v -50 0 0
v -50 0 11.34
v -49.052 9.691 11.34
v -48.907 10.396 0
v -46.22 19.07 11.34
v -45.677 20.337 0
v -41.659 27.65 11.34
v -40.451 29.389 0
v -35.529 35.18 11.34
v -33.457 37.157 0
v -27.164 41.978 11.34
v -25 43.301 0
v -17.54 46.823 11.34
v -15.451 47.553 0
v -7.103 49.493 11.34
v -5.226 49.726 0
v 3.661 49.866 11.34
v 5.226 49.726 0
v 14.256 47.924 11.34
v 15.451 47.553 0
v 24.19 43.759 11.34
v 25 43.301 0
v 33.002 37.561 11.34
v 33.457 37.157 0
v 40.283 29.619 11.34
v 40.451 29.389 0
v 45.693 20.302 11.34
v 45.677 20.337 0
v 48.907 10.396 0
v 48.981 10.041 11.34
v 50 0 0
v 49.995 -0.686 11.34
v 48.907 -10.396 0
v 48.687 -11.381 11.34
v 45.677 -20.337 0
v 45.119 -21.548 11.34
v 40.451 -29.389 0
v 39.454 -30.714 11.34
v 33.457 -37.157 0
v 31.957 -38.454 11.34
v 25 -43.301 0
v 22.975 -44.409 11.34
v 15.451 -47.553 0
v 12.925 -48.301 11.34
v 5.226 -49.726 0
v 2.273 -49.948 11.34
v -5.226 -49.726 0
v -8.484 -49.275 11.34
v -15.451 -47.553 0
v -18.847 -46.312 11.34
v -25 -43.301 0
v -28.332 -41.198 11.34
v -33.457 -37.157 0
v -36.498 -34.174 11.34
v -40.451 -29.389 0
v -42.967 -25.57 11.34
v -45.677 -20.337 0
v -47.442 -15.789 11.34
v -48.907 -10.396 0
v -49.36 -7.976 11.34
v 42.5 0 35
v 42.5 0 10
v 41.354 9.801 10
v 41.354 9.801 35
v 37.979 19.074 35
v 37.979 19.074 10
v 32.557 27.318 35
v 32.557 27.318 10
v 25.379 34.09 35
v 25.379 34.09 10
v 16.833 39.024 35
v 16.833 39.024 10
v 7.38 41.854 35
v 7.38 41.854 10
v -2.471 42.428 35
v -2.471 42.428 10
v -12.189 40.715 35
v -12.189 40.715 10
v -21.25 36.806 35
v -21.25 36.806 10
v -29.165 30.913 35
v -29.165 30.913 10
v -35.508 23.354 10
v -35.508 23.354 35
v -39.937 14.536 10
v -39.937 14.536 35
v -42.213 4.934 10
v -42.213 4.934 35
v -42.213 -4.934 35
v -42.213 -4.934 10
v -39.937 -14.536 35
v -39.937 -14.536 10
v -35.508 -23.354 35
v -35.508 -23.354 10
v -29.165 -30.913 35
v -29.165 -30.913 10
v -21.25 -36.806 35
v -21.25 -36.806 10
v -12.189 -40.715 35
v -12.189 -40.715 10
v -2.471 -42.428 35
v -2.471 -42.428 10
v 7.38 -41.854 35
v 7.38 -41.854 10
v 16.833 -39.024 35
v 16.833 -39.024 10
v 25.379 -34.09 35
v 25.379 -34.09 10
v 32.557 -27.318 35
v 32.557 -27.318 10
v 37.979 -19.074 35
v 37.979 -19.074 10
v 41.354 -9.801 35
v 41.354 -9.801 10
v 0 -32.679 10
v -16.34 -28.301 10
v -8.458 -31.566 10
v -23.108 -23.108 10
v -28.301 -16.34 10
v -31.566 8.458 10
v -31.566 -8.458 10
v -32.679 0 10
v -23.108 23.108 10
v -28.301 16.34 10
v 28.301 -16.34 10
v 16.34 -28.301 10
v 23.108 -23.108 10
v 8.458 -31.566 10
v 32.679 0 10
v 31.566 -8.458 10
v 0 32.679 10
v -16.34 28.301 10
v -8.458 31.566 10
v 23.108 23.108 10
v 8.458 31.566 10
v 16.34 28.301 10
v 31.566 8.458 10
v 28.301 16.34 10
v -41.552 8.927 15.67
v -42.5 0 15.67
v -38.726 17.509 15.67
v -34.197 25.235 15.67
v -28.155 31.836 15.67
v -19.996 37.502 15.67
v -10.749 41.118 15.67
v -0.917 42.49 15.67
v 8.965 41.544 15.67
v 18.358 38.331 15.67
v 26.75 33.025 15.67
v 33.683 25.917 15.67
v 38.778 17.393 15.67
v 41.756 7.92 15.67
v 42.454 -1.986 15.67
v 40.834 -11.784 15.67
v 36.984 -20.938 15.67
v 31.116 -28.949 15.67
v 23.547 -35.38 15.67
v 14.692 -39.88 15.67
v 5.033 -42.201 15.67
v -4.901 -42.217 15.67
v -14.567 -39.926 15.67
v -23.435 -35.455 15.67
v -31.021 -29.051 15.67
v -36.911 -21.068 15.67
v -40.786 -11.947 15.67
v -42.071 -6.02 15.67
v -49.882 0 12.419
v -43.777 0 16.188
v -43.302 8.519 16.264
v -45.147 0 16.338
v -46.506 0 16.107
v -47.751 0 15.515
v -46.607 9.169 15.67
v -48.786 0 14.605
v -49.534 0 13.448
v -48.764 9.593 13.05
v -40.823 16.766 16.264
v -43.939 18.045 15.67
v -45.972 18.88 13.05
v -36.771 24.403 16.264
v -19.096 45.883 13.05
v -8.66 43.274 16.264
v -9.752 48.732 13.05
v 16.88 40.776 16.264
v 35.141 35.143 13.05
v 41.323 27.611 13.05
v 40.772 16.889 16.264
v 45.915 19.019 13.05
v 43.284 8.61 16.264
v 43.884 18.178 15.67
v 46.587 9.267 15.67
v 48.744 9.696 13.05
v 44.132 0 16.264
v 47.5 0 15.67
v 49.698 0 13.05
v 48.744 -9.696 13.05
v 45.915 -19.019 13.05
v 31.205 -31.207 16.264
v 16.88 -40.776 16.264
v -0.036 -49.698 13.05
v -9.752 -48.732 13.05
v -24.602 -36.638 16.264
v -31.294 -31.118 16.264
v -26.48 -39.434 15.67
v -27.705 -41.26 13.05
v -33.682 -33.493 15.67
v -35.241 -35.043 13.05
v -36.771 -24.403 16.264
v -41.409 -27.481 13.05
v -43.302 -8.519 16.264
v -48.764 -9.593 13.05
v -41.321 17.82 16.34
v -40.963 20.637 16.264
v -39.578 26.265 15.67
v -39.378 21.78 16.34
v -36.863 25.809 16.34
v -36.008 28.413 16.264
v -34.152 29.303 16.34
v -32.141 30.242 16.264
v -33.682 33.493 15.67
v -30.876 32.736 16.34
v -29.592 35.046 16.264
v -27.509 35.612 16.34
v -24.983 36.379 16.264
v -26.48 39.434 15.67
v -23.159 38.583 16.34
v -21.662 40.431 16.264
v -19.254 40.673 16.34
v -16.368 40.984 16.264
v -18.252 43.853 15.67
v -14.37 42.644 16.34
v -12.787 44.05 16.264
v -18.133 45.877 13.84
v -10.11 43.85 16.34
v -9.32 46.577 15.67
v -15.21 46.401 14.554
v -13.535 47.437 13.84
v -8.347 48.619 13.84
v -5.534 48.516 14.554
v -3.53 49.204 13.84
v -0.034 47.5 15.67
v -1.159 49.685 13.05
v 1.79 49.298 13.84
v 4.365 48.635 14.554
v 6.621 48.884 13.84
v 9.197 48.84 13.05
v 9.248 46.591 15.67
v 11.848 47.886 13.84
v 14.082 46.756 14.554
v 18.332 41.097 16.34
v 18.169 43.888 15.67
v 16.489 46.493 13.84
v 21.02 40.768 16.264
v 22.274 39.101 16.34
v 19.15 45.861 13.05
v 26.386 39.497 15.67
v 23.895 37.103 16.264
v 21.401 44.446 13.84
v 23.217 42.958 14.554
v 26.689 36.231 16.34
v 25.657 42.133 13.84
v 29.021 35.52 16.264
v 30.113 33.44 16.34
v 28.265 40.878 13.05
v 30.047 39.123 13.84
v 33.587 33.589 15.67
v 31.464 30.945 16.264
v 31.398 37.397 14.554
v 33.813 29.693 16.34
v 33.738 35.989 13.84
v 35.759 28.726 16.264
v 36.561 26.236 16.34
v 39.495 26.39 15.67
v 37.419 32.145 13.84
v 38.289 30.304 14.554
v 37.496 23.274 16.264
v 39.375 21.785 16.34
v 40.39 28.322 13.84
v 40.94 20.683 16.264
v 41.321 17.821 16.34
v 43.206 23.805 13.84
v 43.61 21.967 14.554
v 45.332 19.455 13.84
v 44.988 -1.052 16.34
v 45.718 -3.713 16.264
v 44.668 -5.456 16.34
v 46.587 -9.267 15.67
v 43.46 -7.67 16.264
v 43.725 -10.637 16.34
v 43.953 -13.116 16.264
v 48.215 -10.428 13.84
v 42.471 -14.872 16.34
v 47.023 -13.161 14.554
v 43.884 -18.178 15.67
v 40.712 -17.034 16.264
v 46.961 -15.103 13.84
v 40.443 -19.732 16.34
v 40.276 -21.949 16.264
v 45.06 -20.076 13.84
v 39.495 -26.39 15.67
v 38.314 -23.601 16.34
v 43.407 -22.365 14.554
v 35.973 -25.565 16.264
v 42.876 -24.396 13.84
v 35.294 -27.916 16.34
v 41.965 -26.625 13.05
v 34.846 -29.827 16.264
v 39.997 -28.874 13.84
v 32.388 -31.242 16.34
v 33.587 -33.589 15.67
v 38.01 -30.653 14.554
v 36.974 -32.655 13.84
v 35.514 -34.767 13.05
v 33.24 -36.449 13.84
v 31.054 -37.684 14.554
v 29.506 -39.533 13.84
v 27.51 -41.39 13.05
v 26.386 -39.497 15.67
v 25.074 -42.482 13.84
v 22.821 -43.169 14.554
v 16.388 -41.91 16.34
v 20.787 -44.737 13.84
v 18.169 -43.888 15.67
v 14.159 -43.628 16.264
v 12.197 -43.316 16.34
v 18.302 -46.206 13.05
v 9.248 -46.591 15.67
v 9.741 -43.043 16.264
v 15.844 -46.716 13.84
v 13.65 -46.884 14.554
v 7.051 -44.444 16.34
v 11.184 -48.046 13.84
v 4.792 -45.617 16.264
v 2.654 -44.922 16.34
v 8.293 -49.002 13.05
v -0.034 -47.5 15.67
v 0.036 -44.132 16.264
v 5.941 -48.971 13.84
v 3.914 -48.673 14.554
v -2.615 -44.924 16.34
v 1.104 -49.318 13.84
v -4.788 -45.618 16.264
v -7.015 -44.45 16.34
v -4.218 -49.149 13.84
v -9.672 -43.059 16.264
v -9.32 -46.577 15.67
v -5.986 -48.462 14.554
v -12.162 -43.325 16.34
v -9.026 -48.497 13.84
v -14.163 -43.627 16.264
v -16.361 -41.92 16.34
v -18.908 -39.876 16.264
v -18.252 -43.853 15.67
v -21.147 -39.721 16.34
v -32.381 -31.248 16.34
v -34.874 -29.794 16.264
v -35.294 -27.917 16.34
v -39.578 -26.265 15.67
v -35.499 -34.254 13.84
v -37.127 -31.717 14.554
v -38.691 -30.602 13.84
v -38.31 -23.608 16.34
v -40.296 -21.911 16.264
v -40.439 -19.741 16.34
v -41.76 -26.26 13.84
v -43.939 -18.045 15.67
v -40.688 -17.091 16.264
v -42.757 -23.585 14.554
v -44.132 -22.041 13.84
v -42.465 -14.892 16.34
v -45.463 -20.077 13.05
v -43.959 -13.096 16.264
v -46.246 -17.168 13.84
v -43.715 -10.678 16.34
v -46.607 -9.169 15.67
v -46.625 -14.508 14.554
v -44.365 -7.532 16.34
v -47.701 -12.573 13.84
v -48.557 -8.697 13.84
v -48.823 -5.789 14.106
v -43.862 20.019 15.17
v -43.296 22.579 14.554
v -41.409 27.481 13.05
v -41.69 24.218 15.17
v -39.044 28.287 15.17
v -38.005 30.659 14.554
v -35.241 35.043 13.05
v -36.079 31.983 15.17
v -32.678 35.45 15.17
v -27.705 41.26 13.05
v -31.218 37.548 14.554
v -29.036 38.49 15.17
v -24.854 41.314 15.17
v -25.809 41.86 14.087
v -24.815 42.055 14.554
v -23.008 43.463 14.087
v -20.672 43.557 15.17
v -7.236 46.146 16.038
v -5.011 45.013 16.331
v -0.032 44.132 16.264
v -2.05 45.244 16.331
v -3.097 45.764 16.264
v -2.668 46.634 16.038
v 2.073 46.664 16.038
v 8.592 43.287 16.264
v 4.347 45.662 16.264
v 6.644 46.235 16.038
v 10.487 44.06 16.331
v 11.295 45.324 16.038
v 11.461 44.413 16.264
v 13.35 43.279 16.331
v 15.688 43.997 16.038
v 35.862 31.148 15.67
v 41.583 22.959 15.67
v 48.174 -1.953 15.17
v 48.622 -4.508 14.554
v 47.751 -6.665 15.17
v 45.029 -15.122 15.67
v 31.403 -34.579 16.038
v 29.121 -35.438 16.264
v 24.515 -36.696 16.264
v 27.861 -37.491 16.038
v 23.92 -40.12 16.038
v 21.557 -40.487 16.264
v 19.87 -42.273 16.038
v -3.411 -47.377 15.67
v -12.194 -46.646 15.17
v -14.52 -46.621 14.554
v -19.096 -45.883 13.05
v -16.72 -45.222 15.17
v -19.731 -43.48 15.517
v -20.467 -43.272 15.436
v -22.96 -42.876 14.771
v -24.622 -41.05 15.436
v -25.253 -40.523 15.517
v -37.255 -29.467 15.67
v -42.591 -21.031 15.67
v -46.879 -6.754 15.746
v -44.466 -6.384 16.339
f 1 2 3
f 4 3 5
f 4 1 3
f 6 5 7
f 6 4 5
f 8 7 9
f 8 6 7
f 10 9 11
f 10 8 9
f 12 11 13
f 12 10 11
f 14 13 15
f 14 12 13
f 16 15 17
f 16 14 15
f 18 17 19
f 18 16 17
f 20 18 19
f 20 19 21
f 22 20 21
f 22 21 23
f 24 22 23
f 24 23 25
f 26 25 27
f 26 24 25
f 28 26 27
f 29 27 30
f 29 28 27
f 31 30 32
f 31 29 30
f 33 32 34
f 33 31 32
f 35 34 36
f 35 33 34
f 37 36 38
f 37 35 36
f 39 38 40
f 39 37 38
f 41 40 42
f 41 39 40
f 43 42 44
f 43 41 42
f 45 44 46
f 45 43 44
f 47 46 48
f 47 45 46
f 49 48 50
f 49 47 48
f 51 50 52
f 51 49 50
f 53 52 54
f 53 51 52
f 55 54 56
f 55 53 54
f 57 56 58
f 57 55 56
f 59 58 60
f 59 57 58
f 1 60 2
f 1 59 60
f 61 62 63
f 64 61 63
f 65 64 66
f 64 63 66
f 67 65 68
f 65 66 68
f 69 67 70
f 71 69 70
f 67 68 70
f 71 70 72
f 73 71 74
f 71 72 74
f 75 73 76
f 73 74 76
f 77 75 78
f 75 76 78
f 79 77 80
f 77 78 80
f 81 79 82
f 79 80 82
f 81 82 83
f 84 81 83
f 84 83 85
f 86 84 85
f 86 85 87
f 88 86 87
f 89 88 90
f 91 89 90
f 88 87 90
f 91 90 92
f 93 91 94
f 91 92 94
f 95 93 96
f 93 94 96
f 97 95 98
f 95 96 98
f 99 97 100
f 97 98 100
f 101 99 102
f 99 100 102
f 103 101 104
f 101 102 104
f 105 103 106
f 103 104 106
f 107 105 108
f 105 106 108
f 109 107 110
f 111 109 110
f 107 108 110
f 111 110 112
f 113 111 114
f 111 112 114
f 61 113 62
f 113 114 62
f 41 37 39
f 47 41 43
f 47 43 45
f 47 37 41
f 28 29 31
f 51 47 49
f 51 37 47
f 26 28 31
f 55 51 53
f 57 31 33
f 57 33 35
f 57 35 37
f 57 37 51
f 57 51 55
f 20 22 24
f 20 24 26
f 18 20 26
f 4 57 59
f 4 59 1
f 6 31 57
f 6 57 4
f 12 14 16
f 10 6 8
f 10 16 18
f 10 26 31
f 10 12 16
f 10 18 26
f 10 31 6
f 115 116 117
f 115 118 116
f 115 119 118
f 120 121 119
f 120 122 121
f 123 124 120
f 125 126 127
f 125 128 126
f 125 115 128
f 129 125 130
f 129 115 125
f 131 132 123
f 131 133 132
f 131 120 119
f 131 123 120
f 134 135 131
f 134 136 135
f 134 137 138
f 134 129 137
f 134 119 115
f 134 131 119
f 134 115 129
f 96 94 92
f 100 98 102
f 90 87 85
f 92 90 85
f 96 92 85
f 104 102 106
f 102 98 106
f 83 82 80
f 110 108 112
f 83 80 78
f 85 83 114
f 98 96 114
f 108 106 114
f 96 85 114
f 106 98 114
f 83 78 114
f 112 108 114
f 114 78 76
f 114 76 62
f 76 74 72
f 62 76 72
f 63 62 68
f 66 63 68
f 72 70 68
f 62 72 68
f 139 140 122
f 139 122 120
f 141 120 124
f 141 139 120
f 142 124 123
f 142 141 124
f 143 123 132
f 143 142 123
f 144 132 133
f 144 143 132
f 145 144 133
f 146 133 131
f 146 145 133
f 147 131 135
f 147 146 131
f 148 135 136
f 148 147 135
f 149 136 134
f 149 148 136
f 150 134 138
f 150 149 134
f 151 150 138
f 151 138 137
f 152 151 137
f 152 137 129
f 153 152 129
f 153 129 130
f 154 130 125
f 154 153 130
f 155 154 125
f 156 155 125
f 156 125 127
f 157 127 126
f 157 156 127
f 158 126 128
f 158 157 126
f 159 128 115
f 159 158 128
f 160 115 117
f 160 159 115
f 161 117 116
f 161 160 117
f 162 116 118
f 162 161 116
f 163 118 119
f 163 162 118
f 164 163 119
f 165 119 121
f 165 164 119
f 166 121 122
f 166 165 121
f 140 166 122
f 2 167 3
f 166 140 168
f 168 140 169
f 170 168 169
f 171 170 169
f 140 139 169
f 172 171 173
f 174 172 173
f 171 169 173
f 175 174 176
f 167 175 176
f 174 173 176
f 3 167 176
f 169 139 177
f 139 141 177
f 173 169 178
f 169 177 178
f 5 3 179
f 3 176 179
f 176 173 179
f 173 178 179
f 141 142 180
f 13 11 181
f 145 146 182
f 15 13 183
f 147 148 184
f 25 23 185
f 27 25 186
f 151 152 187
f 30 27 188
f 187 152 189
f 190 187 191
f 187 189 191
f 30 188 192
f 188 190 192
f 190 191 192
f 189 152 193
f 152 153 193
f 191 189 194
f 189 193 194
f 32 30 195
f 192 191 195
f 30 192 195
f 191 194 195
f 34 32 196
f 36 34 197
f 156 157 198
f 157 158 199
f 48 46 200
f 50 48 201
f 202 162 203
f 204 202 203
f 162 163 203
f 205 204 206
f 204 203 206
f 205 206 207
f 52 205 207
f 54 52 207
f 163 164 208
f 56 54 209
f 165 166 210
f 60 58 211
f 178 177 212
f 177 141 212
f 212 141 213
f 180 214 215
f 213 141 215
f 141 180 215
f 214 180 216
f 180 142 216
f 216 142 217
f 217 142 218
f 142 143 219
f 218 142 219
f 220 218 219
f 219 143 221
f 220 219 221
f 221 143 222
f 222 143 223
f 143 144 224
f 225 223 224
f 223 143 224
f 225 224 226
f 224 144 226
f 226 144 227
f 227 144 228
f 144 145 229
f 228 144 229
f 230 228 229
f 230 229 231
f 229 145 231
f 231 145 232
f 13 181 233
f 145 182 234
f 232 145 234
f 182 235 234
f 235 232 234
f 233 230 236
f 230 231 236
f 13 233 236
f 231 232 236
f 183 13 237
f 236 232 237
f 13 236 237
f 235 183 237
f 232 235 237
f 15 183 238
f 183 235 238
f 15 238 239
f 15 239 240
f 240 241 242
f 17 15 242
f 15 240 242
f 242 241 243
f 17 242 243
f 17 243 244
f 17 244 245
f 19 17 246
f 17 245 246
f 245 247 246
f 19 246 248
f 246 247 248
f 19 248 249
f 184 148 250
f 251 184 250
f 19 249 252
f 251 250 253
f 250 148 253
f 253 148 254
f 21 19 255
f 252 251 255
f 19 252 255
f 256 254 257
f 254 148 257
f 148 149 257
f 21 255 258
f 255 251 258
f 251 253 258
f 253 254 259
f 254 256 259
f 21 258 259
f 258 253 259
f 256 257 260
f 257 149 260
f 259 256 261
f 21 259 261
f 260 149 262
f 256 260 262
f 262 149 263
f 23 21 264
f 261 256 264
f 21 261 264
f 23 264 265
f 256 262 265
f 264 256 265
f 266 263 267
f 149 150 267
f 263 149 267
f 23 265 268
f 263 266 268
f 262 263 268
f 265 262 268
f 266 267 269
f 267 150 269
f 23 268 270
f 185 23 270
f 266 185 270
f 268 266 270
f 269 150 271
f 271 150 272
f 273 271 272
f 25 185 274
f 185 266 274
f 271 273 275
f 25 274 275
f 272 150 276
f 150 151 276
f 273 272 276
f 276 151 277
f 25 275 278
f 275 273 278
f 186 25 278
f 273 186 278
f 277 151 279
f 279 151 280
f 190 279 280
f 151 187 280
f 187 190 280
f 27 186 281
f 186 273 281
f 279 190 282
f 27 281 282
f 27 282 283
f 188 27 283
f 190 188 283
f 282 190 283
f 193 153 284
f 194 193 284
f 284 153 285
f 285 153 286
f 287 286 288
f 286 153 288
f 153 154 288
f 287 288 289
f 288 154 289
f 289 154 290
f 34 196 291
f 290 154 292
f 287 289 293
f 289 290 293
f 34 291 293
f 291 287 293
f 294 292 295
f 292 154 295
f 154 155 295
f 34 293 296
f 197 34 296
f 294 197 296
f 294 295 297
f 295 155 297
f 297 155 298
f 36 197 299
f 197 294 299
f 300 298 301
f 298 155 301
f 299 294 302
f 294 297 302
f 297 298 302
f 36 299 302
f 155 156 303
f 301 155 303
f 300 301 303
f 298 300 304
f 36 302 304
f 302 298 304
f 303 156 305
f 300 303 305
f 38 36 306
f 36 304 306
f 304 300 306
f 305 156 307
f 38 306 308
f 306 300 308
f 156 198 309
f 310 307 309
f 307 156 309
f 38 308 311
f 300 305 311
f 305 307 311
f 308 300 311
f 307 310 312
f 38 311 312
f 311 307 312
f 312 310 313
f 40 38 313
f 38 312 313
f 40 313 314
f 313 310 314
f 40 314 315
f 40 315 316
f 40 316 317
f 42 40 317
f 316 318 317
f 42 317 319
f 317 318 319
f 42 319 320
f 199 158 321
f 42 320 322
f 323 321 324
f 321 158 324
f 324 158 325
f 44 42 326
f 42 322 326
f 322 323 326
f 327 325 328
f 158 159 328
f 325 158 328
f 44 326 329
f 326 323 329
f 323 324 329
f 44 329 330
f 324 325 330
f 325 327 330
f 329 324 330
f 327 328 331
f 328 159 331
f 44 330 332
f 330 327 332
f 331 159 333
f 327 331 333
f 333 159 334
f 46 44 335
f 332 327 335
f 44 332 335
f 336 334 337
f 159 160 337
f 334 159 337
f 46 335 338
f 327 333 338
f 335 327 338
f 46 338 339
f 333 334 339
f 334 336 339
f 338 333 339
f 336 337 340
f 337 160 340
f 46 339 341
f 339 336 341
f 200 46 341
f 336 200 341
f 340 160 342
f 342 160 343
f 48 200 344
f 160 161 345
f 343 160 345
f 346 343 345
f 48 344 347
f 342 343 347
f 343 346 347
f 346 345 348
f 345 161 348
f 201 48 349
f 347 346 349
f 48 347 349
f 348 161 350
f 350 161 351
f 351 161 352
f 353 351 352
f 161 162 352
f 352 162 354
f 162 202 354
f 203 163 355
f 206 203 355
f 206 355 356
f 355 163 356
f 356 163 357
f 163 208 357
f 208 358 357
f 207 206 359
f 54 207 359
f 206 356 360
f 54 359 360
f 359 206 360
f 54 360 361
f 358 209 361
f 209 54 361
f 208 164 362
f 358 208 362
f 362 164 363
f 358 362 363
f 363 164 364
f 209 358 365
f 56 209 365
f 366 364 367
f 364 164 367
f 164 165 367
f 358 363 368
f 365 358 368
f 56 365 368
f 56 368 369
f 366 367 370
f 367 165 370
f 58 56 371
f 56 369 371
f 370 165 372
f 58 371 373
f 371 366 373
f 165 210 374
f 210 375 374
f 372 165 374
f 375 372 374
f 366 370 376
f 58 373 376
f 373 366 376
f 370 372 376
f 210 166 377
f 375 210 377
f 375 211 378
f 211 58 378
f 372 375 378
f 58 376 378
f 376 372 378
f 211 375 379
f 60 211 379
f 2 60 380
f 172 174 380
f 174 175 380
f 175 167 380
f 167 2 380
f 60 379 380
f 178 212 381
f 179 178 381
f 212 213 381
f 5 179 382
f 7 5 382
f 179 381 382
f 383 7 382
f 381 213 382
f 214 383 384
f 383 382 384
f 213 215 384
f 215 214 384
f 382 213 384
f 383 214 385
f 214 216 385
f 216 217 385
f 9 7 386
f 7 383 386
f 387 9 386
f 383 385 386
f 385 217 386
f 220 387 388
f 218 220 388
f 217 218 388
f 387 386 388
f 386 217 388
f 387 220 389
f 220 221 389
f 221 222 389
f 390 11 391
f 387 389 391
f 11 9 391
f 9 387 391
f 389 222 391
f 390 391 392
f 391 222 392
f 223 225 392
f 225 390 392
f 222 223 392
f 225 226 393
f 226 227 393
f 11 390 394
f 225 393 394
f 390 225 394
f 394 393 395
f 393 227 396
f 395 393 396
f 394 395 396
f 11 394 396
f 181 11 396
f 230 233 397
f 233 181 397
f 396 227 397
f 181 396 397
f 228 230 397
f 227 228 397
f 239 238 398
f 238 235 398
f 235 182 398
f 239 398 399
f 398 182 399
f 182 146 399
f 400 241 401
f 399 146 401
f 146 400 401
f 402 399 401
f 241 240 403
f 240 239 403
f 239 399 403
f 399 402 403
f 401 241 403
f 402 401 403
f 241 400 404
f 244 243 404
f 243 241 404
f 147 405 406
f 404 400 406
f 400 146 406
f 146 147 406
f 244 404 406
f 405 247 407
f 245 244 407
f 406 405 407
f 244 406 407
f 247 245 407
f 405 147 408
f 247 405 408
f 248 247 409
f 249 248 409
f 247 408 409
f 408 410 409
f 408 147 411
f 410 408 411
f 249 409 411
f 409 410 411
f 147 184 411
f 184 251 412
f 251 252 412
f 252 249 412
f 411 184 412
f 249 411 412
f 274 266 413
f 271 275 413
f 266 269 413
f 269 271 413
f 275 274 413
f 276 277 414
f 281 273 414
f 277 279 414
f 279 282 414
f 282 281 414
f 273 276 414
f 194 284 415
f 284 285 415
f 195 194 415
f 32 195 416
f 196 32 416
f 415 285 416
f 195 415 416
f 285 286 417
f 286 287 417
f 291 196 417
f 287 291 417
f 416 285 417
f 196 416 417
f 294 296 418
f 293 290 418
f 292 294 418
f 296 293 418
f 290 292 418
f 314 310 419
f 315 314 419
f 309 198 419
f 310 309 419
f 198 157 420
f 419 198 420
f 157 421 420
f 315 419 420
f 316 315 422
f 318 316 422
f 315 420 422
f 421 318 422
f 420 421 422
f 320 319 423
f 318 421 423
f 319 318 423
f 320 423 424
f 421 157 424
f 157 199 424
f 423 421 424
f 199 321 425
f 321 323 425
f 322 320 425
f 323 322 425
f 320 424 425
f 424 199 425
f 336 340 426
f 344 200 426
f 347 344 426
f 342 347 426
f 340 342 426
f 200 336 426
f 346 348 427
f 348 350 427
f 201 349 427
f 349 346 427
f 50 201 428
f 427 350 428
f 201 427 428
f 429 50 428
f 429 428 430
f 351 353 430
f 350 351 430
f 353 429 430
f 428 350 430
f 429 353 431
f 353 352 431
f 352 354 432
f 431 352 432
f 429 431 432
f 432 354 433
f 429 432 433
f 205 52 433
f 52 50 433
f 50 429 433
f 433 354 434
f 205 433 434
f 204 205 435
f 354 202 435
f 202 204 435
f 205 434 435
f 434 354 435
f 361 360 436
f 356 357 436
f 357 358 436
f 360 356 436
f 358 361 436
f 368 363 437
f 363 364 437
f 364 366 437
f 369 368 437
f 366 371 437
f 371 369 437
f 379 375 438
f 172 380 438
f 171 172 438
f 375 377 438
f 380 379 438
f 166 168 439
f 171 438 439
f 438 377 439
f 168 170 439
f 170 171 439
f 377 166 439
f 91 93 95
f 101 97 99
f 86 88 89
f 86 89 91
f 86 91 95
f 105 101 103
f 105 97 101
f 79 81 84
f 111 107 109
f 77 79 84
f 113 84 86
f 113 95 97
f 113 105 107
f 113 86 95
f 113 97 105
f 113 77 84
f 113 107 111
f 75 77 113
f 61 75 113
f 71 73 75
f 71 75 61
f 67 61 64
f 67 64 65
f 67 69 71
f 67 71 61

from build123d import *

# Parameters (mm, degrees)
F2_R     = 5
F3_R     = 42.5
F3_R_2   = 32.679492
F4_DEPTH = 25


with BuildPart() as f1:
    # F0 (on Front) → F1 (revolve)
    with BuildSketch(Plane.XZ):
        Polygon((-50, 0), (0, 0), (0, 10), (-32.679492, 10), (-50, 20), align=None)
    revolve(axis=Axis((0, 0, 5), (0, 0, -1)))

    # F2
    f2_edges = [f1.edges().sort_by_distance(p)[0] for p in [
        (50, 0, 20),
    ]]
    fillet(f2_edges, radius=F2_R)


with BuildPart() as f4:
    # F3 (on face) → F4 (new body)
    with BuildSketch(Plane.XY.offset(10)):
        Circle(F3_R)
        Circle(F3_R_2, mode=Mode.SUBTRACT)
        Circle(F3_R_2)
    extrude(amount=F4_DEPTH)


solid = Compound([f1.part, f4.part])
